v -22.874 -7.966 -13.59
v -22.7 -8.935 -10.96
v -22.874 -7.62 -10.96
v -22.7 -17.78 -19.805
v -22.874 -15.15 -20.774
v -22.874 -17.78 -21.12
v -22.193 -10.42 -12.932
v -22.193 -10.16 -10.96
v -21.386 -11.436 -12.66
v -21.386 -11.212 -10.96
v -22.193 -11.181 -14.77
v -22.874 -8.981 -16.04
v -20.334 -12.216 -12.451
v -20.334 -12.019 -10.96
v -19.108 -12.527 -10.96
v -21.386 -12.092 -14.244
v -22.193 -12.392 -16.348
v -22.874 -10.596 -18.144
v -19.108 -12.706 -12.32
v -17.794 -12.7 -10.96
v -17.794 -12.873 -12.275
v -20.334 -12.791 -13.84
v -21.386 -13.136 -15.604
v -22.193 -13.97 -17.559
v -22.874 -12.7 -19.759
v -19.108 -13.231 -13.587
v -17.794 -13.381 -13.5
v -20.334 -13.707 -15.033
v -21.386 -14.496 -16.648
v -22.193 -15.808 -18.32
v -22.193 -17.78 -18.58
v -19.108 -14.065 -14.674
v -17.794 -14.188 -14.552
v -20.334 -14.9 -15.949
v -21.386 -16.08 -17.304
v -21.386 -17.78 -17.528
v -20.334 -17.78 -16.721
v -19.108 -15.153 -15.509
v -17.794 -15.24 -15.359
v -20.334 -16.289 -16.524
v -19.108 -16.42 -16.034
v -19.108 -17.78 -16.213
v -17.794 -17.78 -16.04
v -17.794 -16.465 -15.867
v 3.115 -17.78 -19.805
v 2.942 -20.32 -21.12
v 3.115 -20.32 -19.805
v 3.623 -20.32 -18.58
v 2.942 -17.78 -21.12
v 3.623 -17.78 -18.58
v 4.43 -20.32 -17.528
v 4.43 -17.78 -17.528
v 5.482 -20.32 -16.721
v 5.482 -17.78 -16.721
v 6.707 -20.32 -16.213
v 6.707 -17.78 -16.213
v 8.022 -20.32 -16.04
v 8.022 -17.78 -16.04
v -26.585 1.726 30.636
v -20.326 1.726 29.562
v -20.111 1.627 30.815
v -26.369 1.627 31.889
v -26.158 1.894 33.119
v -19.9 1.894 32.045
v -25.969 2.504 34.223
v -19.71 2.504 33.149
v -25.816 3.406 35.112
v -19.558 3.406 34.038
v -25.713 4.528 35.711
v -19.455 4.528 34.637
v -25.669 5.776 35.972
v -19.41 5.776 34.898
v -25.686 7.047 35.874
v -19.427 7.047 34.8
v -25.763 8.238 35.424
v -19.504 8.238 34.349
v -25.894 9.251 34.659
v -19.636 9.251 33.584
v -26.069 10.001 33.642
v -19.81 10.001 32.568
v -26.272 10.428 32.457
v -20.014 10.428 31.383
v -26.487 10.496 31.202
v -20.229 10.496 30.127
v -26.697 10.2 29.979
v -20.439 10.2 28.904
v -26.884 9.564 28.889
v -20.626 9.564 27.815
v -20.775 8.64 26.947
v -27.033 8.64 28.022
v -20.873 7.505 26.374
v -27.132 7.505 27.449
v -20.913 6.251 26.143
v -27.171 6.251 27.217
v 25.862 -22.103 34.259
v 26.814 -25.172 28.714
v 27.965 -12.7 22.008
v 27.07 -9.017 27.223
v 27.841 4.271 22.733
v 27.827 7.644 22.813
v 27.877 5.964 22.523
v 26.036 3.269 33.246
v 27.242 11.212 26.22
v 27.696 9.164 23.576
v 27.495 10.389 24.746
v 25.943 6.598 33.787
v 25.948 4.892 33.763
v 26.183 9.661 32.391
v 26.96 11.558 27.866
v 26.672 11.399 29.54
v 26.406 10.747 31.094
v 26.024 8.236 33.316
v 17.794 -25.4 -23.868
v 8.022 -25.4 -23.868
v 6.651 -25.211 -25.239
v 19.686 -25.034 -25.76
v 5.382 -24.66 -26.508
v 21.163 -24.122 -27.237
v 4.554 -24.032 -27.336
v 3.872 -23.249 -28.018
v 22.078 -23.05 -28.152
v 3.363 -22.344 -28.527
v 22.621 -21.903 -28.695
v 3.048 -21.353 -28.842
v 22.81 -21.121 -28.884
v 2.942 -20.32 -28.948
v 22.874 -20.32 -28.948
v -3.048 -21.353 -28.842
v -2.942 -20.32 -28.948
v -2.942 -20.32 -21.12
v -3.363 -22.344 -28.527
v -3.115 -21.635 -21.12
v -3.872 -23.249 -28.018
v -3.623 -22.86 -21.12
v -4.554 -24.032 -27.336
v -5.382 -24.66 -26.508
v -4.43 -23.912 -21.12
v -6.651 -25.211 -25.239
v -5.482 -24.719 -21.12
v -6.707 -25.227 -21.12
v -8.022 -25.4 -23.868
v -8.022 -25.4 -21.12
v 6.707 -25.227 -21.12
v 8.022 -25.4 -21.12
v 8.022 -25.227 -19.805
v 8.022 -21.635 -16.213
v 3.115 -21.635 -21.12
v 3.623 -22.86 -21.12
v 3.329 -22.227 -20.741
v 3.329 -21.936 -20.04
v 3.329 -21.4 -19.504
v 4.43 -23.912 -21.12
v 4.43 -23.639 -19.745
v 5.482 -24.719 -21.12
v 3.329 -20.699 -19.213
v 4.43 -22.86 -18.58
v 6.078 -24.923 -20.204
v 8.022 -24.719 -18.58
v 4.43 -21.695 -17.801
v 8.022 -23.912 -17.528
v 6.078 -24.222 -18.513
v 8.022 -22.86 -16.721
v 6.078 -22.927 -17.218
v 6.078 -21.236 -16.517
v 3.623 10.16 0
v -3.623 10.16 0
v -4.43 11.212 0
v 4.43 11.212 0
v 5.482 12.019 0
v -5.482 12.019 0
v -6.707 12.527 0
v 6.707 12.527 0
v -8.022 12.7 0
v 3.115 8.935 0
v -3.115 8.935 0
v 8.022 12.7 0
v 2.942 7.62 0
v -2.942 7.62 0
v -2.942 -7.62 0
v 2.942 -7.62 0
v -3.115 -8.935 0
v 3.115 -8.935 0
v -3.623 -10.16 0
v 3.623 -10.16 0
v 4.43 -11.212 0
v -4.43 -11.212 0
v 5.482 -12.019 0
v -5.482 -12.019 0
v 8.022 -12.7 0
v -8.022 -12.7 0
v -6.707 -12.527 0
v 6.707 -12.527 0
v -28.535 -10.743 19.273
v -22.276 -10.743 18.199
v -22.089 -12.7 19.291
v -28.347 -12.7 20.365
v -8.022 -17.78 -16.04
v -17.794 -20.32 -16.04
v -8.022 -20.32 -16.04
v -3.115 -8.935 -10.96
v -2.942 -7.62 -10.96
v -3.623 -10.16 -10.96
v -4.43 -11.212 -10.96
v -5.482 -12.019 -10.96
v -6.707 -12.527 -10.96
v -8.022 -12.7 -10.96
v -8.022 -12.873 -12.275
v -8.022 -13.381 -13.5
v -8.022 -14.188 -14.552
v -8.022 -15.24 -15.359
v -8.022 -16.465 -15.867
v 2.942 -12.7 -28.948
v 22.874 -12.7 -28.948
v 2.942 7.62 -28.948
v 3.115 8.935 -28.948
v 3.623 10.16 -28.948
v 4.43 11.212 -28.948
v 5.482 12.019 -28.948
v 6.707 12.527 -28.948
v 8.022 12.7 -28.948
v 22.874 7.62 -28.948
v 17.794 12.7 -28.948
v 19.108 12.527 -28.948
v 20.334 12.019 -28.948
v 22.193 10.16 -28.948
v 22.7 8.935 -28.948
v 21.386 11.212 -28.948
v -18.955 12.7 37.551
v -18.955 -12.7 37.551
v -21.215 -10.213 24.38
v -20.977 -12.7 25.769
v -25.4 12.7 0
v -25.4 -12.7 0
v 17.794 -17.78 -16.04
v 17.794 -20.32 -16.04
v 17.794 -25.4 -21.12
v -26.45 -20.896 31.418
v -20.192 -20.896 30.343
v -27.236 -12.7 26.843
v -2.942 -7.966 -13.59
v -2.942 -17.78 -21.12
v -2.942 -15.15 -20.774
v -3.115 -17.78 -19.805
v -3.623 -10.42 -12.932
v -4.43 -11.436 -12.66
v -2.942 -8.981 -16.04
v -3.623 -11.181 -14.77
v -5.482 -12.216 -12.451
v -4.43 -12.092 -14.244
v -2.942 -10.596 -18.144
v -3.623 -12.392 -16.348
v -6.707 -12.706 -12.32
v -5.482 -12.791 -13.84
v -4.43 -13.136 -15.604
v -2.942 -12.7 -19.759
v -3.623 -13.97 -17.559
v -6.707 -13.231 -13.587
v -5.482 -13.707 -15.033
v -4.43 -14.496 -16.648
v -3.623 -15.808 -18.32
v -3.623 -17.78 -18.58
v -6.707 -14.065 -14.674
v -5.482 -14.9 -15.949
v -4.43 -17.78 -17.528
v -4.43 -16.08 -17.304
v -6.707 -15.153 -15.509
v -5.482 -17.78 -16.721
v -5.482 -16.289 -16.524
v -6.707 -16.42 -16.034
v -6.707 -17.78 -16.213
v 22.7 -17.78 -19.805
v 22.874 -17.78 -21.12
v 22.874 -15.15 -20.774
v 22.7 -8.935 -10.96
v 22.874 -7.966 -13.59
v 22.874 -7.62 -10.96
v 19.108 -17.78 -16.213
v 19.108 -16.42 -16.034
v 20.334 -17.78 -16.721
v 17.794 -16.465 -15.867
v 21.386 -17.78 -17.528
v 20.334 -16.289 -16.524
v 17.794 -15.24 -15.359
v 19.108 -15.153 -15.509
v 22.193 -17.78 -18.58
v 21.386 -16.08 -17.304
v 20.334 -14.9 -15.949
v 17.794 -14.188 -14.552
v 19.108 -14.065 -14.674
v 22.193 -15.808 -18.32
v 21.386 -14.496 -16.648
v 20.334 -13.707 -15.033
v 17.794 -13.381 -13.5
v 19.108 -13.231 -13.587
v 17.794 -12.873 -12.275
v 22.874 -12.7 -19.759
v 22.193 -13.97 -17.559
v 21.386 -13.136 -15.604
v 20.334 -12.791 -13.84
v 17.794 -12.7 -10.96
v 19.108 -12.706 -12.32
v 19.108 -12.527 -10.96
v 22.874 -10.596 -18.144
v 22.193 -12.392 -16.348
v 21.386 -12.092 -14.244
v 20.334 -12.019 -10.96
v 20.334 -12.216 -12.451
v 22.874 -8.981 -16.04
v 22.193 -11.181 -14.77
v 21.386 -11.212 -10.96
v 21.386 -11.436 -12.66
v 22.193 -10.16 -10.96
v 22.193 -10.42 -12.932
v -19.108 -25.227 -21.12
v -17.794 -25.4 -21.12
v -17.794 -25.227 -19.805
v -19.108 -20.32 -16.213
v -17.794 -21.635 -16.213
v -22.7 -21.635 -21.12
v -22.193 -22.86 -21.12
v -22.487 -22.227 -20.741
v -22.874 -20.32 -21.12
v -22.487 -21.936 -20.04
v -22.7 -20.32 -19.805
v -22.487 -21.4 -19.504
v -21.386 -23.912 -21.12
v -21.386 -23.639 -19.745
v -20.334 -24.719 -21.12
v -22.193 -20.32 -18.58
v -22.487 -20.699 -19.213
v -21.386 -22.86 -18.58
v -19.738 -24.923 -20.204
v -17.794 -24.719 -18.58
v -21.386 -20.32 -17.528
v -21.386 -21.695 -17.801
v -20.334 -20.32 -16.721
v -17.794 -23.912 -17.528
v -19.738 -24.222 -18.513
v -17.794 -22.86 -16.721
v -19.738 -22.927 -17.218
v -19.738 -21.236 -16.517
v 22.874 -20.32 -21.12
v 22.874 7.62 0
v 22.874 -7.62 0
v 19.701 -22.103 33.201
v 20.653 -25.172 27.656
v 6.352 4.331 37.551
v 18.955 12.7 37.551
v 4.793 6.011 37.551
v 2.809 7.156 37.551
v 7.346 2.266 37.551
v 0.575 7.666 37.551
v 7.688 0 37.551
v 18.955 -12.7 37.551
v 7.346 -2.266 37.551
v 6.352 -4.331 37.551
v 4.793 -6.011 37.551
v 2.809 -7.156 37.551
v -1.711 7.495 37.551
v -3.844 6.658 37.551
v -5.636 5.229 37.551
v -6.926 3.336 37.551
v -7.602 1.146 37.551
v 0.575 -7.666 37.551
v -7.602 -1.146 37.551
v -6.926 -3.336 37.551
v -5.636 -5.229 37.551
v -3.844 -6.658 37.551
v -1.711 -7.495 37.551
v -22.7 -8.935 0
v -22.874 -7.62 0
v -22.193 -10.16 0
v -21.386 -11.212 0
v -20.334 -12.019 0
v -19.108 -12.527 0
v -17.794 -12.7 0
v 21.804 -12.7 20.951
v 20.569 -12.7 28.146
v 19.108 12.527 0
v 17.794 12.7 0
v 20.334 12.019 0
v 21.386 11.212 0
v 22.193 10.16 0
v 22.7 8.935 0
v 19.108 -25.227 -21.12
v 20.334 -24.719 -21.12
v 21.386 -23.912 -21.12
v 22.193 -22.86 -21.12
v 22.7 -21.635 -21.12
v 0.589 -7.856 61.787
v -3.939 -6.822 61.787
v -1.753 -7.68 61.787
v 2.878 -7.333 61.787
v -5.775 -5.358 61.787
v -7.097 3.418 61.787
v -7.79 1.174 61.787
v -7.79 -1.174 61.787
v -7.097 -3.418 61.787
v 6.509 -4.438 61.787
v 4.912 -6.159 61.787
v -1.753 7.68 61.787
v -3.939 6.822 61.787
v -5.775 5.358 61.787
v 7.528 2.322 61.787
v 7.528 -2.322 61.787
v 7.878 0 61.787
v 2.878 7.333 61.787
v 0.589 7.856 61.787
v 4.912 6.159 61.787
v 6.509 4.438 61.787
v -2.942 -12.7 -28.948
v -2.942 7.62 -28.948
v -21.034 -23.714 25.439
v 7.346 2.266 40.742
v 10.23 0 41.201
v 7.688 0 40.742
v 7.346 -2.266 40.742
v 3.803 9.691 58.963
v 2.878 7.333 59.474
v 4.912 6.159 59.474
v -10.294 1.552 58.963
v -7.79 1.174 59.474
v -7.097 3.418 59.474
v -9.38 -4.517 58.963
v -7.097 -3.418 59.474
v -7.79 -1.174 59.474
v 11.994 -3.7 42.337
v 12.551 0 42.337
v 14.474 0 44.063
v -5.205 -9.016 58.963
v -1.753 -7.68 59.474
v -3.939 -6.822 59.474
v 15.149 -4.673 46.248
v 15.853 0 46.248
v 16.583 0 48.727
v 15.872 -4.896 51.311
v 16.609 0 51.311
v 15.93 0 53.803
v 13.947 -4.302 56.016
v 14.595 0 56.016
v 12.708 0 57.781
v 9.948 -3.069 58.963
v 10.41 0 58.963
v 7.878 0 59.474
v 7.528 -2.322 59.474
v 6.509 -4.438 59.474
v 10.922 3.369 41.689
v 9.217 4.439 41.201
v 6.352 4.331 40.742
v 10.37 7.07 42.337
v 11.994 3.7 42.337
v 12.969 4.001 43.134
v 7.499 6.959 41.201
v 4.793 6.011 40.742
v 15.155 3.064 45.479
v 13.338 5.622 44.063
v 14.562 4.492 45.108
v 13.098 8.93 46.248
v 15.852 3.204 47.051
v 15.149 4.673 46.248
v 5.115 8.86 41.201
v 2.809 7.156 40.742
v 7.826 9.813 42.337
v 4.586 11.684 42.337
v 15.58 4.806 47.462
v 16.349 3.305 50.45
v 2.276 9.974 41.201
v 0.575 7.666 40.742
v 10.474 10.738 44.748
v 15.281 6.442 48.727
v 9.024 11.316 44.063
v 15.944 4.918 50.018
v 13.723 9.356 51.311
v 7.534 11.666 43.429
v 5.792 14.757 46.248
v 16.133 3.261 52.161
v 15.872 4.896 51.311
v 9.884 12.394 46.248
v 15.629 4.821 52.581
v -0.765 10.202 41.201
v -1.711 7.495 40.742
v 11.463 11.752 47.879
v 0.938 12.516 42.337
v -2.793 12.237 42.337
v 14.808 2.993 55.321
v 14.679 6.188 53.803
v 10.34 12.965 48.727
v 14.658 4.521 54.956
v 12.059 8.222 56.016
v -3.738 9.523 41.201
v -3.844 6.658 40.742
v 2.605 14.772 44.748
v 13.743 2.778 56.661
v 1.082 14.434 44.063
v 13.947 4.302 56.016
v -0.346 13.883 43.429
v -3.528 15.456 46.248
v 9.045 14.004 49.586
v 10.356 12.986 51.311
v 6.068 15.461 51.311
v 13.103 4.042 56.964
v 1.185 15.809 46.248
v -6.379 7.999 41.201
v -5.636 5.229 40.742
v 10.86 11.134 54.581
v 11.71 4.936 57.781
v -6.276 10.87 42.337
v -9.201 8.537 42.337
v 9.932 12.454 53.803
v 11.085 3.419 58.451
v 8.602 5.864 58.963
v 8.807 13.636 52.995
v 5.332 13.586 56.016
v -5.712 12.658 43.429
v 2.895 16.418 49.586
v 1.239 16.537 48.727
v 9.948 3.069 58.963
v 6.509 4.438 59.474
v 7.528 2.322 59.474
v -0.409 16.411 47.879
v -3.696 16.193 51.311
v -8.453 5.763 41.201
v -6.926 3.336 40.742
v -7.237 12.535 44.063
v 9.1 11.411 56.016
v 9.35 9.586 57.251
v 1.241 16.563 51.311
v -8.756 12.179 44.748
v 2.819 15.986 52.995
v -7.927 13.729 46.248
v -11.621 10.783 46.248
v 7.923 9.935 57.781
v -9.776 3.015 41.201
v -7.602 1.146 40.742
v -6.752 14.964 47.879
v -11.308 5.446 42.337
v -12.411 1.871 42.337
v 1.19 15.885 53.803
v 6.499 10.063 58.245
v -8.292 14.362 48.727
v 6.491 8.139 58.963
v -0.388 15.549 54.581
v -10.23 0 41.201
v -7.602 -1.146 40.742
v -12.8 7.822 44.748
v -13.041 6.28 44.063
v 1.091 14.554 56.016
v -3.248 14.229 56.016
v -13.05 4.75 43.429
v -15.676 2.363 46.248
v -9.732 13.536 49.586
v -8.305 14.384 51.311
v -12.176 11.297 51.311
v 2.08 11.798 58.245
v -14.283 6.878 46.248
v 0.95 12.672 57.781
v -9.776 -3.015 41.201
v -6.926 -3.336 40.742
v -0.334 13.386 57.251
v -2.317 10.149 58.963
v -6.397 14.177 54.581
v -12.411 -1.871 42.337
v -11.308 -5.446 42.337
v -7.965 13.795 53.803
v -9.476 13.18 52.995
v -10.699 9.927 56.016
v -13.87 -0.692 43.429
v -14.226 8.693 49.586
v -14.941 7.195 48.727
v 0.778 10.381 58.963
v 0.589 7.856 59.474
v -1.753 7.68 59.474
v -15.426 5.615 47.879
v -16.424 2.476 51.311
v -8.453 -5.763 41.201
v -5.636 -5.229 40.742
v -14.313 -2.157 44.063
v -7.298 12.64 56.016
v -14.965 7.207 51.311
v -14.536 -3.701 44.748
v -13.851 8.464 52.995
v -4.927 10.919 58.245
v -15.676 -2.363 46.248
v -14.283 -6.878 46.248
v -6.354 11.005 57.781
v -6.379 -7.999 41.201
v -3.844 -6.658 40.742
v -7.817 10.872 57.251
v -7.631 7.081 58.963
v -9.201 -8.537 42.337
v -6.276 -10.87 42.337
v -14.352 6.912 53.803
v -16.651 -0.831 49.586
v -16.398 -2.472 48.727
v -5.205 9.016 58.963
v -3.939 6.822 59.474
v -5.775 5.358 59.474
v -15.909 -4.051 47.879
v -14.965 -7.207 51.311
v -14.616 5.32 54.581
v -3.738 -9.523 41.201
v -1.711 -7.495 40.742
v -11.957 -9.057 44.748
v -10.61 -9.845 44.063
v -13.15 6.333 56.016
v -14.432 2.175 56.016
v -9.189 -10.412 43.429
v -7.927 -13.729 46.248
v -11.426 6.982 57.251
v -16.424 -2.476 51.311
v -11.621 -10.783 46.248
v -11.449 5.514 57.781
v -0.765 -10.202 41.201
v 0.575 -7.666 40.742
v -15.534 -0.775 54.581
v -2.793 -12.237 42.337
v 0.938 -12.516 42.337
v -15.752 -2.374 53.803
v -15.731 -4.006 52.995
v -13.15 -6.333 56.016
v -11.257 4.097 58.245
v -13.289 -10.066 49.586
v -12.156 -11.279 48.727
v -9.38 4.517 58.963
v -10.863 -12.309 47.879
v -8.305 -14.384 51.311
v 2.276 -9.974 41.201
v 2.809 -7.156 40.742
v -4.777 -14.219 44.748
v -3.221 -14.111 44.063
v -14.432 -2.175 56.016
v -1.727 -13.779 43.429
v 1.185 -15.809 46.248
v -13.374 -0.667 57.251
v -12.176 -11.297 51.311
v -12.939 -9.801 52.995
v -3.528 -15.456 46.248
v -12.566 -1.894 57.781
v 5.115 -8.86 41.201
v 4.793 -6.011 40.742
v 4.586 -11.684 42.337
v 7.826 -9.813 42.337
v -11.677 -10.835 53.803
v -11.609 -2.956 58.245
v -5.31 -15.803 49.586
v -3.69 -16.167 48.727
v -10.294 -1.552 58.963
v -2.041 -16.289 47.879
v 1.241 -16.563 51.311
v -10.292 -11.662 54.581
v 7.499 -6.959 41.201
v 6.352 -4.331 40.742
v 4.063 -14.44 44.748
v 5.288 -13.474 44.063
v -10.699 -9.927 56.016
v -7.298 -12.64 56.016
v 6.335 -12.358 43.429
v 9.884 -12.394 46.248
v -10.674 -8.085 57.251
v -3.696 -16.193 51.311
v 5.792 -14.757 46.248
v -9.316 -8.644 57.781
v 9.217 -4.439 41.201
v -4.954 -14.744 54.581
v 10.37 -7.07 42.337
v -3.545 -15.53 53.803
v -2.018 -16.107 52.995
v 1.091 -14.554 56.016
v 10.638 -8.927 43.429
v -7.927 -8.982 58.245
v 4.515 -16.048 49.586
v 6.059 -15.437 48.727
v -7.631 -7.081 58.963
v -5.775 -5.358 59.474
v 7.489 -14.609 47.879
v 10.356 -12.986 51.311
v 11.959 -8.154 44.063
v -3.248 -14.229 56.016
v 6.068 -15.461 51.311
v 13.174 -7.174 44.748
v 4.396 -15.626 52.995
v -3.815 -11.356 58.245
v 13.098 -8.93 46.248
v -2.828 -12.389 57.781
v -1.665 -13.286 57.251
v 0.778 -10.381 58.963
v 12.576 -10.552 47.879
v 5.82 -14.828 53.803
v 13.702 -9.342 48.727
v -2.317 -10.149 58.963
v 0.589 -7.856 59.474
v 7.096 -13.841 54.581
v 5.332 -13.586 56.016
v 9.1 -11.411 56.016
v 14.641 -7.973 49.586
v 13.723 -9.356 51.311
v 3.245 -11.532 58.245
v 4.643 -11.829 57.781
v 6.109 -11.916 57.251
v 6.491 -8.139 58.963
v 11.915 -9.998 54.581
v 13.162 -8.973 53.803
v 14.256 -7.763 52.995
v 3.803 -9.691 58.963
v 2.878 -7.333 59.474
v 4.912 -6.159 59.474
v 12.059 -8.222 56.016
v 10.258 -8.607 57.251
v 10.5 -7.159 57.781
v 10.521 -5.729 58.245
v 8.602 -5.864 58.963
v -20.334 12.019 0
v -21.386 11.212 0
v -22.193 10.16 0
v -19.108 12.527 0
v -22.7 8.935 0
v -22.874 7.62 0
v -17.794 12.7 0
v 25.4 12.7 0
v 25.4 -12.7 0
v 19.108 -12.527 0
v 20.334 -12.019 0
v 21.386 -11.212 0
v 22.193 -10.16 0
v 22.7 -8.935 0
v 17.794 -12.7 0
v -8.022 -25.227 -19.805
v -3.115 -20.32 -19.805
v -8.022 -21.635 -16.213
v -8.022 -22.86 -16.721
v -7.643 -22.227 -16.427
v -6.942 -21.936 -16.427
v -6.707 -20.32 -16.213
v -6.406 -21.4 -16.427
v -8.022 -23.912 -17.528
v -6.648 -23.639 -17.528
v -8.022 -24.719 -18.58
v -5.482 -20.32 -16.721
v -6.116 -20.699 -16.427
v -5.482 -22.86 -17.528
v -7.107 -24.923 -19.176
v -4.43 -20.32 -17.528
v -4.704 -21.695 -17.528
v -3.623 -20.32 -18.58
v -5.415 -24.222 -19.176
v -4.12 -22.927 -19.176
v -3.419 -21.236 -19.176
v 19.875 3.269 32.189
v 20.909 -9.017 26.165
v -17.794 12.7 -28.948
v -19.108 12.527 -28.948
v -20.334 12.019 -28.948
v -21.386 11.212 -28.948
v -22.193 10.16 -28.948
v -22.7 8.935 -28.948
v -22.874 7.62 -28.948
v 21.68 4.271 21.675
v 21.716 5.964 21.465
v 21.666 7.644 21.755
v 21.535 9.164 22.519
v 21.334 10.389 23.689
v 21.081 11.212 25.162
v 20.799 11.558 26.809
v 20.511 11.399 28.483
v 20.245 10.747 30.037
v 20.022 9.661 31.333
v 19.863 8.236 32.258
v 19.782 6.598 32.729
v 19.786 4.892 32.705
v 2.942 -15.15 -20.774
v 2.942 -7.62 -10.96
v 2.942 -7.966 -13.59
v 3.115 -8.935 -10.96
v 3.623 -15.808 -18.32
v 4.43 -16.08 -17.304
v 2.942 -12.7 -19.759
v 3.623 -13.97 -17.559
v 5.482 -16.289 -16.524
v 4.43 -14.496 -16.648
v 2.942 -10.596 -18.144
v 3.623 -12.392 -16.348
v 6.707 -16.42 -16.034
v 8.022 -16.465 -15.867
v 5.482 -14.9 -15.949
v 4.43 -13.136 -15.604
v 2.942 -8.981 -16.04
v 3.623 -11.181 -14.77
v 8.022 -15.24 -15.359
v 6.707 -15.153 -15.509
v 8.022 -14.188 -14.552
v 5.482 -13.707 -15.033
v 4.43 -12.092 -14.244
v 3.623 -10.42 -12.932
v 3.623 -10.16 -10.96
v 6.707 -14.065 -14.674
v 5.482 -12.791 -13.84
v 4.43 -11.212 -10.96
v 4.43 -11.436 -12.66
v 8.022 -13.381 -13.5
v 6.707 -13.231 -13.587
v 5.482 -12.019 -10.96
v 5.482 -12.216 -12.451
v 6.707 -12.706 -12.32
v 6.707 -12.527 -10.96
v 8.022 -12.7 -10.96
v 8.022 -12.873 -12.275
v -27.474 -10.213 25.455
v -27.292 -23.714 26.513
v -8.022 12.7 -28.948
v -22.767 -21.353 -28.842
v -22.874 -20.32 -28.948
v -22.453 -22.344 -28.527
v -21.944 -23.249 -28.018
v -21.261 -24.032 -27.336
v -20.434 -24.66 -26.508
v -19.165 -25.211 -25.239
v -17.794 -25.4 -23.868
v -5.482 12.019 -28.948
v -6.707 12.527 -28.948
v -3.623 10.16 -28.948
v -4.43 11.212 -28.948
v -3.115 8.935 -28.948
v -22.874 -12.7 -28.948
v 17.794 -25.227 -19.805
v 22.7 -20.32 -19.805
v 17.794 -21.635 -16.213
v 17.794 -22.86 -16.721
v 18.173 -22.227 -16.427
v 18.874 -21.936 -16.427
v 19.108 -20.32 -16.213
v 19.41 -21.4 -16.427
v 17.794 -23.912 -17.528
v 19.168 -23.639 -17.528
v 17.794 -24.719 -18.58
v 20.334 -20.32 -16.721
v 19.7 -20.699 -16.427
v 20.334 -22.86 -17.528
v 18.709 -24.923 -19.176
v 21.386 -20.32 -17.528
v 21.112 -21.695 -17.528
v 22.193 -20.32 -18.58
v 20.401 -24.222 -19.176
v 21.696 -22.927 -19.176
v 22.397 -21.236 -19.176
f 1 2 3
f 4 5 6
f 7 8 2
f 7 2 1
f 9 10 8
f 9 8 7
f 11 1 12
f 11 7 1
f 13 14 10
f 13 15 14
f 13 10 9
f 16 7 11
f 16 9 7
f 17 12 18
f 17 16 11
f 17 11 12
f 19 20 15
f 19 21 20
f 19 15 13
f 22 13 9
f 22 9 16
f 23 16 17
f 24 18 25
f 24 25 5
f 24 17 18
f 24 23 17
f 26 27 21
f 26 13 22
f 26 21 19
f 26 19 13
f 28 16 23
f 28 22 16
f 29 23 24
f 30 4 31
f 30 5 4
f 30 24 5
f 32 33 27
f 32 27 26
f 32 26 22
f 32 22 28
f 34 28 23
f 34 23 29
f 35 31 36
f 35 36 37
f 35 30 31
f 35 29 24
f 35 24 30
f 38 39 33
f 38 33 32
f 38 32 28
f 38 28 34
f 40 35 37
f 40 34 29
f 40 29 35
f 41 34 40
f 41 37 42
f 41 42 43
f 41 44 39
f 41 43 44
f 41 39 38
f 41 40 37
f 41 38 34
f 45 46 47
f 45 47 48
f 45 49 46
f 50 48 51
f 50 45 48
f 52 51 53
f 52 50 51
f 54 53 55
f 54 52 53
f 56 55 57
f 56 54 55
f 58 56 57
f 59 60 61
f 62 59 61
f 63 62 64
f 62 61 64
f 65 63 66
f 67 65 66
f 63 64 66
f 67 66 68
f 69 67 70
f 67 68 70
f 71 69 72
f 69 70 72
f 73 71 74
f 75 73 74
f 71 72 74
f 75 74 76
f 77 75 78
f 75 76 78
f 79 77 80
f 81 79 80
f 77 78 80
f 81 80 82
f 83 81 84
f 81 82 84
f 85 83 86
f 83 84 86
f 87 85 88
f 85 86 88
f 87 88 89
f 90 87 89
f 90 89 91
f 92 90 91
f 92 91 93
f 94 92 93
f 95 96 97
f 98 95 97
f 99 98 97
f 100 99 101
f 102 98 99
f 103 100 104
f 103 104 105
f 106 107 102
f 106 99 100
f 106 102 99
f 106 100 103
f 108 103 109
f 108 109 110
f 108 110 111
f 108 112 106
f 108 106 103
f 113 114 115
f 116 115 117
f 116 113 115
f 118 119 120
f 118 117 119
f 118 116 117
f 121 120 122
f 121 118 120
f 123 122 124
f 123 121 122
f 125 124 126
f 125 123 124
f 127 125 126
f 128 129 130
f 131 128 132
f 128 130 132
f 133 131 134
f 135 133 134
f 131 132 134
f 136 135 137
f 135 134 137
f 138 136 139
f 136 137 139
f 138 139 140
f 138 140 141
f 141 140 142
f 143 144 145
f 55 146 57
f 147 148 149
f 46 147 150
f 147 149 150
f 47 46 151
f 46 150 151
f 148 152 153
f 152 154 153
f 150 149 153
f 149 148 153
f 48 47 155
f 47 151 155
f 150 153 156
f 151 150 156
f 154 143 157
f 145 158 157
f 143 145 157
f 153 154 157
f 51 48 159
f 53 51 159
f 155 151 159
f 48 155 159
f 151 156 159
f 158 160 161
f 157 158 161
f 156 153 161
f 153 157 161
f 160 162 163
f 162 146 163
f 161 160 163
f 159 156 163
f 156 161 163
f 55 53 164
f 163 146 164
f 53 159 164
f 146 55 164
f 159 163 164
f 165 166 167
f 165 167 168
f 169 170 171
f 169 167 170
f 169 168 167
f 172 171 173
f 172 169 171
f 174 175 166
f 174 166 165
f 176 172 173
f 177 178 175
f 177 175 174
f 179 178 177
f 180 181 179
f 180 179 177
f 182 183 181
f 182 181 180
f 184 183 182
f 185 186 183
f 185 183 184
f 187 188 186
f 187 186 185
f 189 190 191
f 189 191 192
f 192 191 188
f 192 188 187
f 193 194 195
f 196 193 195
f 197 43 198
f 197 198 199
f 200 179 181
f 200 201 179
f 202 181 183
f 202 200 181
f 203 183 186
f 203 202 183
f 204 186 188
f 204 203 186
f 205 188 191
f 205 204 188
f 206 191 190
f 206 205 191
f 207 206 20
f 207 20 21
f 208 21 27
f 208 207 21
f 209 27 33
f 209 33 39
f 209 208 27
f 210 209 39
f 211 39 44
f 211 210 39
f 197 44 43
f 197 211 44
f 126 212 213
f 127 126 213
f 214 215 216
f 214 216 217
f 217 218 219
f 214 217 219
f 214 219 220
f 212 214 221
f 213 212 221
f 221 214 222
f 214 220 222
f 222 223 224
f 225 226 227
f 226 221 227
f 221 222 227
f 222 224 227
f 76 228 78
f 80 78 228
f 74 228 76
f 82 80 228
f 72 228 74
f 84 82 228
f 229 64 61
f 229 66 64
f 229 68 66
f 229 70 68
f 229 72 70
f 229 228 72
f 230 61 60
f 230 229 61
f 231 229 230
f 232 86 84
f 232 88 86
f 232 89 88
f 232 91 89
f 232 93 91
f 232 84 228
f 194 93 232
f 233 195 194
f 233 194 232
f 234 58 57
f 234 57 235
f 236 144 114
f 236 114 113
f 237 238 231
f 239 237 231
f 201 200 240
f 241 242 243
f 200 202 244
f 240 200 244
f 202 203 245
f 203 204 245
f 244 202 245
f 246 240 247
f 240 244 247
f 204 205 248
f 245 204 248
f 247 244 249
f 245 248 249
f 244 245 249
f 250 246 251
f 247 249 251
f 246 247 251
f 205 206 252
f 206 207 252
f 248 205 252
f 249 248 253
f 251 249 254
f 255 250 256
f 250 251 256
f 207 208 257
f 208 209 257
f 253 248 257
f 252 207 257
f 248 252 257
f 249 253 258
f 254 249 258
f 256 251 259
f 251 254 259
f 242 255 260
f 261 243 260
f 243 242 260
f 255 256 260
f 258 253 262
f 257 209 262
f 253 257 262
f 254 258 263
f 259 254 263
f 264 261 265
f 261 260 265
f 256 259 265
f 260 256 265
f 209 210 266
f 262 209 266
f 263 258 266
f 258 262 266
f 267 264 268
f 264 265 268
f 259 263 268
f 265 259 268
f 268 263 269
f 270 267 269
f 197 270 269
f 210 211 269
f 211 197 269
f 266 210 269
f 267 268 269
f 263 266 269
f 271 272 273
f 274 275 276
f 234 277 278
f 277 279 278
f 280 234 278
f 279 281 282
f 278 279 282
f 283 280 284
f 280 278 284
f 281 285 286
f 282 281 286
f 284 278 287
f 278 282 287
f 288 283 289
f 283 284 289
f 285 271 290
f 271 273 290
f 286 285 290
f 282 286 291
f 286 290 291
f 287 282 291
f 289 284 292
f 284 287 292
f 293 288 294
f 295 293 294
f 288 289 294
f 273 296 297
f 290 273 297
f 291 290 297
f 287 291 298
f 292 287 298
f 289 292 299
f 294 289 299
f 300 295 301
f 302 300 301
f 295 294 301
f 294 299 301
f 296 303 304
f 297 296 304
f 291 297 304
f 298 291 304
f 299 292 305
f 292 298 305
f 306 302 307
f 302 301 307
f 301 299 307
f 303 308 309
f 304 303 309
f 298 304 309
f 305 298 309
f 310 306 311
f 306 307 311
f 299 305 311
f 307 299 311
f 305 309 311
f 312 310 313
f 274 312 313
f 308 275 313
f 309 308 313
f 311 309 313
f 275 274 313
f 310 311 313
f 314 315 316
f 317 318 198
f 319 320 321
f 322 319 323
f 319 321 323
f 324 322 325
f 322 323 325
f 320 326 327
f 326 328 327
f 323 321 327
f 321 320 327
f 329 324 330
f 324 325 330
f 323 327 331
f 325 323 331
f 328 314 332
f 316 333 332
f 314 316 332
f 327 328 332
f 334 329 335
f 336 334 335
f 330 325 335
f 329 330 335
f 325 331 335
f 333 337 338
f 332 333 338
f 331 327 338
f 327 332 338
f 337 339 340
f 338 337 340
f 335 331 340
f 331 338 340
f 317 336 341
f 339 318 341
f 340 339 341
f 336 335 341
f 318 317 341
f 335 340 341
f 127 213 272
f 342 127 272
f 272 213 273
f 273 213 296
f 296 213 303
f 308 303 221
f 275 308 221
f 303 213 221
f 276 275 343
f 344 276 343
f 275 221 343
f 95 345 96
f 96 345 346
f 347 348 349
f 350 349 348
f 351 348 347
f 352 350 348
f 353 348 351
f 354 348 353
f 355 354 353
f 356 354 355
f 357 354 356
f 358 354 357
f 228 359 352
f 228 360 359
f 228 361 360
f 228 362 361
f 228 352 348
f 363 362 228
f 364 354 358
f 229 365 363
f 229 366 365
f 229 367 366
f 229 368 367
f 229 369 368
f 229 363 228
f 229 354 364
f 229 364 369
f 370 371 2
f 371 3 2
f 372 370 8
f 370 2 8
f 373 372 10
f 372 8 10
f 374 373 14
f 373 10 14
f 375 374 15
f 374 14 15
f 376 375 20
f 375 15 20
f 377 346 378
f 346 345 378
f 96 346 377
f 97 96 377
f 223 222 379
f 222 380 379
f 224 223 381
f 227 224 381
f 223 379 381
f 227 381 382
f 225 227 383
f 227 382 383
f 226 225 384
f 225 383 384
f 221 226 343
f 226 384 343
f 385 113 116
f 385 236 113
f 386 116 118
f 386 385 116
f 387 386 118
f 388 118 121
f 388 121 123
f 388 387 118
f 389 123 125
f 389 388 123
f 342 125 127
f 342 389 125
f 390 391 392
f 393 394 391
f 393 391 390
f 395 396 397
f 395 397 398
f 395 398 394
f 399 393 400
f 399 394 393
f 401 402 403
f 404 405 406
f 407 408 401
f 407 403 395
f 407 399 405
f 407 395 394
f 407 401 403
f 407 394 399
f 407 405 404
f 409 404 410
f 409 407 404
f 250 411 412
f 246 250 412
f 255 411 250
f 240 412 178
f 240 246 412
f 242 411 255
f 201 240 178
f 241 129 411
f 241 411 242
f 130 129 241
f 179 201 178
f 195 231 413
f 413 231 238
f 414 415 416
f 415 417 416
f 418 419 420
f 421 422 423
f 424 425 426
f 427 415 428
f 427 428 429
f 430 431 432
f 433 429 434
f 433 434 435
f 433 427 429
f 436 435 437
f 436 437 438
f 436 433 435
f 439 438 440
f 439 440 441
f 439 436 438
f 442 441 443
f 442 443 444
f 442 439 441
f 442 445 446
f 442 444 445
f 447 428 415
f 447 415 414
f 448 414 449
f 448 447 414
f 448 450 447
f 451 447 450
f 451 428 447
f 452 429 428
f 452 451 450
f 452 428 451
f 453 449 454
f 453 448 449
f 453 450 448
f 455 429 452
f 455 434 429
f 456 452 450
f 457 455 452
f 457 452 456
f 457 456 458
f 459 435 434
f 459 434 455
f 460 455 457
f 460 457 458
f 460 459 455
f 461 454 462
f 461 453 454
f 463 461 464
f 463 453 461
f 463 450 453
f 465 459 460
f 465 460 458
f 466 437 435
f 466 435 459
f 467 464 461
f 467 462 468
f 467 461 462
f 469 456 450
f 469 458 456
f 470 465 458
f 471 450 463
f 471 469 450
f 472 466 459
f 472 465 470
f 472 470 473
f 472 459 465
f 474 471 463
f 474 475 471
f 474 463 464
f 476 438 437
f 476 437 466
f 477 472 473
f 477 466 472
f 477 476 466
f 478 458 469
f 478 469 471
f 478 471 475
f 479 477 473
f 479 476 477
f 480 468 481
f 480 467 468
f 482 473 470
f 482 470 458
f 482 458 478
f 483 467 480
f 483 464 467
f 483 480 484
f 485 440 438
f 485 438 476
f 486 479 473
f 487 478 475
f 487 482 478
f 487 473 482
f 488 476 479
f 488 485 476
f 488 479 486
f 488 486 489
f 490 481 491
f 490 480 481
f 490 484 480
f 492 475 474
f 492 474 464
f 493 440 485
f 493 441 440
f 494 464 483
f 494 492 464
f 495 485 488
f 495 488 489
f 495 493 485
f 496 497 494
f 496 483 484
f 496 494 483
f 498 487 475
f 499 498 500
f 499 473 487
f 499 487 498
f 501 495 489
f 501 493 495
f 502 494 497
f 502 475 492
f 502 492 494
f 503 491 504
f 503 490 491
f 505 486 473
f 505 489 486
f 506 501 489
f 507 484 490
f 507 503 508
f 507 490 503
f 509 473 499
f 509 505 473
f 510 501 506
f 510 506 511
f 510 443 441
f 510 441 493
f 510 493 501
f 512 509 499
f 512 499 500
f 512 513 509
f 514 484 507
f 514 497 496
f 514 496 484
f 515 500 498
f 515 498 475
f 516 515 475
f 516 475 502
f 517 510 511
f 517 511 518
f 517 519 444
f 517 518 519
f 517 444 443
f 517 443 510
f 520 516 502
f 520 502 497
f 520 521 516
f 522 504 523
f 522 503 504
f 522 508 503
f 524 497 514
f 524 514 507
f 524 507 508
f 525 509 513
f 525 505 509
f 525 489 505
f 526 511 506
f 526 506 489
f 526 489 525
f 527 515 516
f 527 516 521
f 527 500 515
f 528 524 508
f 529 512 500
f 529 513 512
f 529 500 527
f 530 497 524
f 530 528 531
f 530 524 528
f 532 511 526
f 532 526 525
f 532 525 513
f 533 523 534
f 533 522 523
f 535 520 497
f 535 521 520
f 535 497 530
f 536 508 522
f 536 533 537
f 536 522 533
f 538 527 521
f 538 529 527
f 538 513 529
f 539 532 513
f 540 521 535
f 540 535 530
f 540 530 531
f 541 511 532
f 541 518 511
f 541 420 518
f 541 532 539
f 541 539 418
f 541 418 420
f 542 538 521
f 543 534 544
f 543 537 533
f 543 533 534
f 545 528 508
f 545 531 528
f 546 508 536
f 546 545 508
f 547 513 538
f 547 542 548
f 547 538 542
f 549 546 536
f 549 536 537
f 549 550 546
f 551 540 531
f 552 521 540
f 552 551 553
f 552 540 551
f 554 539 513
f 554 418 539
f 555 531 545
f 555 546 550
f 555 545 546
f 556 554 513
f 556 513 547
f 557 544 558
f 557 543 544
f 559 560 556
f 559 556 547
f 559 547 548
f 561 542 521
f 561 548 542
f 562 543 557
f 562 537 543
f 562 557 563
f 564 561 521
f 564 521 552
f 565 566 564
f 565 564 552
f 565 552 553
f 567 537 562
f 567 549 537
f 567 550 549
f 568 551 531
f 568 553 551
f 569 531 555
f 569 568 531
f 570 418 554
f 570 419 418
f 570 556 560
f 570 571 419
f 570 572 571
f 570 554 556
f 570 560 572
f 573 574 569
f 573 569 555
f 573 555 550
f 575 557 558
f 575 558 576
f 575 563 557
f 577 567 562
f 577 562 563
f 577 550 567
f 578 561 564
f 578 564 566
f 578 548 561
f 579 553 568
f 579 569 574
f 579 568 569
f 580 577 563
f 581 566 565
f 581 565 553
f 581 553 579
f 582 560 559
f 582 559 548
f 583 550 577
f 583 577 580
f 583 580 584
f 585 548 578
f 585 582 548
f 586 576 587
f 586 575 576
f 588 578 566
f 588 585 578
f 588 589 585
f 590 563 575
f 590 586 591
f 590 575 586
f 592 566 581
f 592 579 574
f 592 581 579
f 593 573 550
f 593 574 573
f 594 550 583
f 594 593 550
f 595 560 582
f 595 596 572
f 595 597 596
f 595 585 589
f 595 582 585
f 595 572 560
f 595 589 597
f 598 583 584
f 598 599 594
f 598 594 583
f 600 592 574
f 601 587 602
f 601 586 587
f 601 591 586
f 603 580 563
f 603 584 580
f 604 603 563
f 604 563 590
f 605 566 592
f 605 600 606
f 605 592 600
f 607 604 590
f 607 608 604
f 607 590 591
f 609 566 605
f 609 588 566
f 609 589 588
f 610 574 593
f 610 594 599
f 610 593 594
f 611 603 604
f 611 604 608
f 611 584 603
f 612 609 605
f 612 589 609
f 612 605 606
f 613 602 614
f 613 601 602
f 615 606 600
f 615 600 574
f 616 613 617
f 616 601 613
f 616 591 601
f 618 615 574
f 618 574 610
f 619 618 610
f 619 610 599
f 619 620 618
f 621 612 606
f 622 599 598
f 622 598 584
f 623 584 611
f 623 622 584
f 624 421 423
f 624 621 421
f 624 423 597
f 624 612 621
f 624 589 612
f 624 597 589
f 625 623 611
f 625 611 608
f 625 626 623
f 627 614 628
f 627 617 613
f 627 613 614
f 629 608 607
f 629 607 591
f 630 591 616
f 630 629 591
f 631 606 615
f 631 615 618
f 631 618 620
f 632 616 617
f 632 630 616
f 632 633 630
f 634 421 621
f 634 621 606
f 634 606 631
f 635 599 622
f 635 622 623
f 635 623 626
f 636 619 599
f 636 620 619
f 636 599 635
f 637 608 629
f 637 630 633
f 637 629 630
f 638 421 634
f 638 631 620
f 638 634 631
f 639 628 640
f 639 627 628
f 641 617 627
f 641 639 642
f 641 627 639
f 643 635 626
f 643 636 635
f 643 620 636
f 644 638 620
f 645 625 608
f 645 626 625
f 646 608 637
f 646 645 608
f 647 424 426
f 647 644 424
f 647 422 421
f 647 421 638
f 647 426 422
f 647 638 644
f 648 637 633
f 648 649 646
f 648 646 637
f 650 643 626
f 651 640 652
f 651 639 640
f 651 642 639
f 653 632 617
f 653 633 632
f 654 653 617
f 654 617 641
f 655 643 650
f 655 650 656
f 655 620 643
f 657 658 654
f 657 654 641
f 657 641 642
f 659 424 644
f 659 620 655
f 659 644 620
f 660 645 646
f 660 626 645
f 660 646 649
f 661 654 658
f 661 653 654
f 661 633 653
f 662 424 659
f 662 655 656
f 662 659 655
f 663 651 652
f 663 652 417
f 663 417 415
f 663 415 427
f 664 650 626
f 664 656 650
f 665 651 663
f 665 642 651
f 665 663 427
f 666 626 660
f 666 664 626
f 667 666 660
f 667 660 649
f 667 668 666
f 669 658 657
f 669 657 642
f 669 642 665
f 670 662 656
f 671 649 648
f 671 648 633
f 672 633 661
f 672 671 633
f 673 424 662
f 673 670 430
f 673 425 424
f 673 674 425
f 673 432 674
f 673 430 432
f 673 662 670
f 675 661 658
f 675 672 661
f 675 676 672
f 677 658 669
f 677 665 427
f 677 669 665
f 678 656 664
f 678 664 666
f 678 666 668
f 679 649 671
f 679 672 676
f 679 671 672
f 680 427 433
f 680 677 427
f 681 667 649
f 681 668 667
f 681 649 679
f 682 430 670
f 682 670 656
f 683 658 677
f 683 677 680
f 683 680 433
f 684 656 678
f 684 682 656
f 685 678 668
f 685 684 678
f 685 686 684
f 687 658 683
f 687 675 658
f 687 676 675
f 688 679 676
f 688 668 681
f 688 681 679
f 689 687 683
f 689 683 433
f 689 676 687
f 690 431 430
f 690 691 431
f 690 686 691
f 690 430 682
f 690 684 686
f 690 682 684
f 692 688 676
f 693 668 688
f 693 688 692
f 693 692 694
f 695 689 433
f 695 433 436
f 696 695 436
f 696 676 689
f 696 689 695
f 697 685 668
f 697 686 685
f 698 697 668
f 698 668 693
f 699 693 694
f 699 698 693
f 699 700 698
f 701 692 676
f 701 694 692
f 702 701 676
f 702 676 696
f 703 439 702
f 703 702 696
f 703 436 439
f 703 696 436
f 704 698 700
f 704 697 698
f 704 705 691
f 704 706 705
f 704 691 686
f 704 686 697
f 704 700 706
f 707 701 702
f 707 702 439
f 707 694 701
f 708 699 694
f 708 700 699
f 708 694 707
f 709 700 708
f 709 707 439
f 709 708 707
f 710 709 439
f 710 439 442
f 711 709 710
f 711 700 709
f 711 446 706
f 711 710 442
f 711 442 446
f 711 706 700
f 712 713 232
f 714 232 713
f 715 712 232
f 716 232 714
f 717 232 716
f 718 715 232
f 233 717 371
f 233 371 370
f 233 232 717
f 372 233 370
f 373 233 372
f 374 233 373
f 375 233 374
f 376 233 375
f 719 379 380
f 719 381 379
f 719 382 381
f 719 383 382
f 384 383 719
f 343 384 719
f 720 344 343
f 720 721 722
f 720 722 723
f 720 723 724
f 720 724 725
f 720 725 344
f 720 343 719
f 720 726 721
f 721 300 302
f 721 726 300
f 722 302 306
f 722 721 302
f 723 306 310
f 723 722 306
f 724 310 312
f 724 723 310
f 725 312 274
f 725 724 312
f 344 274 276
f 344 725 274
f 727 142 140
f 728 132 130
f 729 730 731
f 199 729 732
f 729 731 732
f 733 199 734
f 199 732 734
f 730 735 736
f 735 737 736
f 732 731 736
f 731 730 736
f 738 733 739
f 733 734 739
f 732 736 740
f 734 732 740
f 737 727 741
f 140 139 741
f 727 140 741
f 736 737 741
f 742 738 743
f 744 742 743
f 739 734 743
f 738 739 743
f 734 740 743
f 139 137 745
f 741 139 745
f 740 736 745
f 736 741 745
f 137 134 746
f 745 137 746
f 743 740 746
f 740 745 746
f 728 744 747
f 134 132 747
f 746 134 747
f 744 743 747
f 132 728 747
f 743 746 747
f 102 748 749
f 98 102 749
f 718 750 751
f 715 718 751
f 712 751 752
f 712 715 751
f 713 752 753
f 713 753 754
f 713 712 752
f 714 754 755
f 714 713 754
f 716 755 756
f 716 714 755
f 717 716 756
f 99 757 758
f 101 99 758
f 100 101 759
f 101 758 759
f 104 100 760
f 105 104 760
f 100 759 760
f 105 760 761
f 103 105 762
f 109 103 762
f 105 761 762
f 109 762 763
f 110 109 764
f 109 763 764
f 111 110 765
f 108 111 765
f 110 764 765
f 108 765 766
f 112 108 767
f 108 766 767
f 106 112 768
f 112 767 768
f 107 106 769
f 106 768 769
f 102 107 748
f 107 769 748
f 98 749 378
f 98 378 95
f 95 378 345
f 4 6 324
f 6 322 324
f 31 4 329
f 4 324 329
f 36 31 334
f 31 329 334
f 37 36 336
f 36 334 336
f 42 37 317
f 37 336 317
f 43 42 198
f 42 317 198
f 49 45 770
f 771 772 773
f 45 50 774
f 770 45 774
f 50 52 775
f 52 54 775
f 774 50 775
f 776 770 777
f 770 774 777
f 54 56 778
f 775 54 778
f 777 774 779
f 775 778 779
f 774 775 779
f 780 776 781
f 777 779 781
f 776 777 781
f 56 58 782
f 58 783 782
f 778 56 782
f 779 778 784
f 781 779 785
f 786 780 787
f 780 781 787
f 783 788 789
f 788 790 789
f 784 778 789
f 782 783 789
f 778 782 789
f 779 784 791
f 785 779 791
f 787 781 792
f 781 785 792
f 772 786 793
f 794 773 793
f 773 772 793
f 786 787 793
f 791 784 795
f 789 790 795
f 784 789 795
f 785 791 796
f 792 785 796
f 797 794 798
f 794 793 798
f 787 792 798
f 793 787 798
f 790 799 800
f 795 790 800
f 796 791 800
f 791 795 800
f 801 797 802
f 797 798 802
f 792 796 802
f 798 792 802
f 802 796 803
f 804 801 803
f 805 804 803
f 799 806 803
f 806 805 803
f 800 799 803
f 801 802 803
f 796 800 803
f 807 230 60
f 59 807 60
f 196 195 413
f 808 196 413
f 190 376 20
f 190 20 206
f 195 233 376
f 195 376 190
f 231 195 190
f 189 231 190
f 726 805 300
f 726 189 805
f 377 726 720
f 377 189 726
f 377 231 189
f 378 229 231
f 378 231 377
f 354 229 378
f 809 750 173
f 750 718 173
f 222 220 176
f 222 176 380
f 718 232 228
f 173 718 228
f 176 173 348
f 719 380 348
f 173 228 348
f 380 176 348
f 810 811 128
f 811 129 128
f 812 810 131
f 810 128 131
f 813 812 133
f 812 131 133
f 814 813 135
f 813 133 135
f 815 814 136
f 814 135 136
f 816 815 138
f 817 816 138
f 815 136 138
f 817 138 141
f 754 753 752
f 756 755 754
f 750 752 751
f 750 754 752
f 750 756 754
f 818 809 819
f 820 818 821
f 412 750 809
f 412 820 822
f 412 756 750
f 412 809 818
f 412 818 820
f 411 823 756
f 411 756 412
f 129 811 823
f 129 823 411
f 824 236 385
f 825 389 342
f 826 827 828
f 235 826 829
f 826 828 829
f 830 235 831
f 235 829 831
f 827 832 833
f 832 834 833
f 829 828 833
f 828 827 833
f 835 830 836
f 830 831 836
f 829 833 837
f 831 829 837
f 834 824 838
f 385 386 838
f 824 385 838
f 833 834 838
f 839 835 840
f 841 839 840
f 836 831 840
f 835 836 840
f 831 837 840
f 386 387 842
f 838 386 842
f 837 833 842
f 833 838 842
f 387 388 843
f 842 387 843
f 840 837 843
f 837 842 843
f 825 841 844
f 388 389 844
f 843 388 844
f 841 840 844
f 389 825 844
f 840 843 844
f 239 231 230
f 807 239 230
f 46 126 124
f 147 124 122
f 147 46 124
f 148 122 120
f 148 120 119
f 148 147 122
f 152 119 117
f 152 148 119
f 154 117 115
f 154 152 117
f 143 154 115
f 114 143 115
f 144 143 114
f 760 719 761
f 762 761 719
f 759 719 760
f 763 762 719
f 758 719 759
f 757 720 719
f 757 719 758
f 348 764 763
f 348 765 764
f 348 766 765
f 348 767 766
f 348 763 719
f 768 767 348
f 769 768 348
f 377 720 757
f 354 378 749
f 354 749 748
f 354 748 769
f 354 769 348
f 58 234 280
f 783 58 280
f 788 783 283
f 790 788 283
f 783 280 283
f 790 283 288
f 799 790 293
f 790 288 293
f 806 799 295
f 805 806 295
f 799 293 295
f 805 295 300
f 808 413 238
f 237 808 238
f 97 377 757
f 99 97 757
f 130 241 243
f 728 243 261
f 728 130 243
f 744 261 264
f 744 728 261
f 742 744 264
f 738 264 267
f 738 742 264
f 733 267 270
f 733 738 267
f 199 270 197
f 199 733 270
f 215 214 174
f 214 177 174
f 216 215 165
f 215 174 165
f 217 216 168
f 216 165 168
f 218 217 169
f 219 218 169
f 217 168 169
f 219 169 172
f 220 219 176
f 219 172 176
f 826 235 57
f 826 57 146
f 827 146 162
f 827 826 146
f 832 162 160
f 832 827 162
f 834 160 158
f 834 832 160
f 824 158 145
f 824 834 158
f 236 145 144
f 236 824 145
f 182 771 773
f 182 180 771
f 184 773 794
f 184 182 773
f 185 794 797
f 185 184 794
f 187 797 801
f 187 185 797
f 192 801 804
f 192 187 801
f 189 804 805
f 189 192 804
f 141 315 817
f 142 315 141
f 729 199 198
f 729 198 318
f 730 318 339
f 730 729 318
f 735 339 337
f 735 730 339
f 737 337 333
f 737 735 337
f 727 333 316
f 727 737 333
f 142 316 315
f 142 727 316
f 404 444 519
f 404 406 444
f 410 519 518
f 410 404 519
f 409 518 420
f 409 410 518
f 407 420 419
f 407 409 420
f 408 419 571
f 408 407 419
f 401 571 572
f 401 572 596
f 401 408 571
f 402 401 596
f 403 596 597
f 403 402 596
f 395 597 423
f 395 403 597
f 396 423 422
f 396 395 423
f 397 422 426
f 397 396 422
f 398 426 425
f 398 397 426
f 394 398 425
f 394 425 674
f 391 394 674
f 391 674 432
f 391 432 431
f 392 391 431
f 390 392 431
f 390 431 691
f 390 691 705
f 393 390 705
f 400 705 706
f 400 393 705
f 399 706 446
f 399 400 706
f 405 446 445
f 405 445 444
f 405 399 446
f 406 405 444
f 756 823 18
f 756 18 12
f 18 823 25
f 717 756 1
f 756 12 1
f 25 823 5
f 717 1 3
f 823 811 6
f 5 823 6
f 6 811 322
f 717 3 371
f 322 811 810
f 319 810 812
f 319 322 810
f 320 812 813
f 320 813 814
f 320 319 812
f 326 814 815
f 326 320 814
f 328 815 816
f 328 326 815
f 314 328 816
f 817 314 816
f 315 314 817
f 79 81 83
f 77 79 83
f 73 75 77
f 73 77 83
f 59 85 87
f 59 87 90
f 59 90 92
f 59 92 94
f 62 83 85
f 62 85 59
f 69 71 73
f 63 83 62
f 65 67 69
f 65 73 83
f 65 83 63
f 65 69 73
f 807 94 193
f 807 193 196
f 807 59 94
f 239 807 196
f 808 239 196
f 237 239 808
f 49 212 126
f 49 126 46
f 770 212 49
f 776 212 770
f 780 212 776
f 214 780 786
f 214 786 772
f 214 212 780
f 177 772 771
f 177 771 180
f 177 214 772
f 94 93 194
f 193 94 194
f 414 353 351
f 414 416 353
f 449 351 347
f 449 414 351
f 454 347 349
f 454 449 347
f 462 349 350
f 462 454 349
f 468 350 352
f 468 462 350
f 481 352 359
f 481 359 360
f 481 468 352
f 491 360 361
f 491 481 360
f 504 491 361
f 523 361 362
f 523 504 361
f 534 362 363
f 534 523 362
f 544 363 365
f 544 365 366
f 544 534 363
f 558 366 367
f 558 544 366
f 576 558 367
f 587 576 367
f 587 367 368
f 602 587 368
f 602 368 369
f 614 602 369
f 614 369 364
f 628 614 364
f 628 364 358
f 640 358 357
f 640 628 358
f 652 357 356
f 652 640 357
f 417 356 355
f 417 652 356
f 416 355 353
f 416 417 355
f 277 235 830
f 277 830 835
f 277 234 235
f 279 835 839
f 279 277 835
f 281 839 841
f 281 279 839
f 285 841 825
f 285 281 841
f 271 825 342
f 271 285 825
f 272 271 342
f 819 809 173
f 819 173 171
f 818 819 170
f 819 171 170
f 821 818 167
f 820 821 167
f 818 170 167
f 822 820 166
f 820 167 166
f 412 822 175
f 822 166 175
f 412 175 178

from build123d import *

# Parameters (mm, degrees)
F0_W      = 19.9313152116
F0_H      = 28.9478618652
F1_DEPTH  = 12.7
F2_W      = 19.9313152116
F2_H      = 12.9078961909
F3_DEPTH  = 12.7
F4_F1_R   = 5.08
F4_F2_R   = 5.08
F8_DEPTH  = 6.2511
F10_DEPTH = 6.35


with BuildPart() as f1:
    # F0 (on Front) → F1 (new body, symmetric)
    with BuildSketch(Plane.XZ):
        Polygon((22.873558104, 0), (25.4, 0), (18.9548347086, 37.5508967185), (0, 37.5508967185), (0, 0), (2.9422428925, 0), align=None)
        with Locations((12.9079004982, -14.4739309326)):
            Rectangle(F0_W, F0_H)
        Polygon((0, 0), (0, 37.5508967185), (-18.9548347086, 37.5508967185), (-25.4, 0), (-22.873558104, 0), (-2.9422428925, 0), align=None)
        with Locations((-12.9079004982, -14.4739309326)):
            Rectangle(F0_W, F0_H)
    extrude(amount=F1_DEPTH, both=True)

    # F2 (on face) → F3 (join)
    with BuildSketch(Plane.XZ.offset(12.7)):
        with Locations((12.9079004982, -22.4939137697)):
            Rectangle(F2_W, F2_H)
        with Locations((-12.9079004982, -22.4939137697)):
            Rectangle(F2_W, F2_H)
    extrude(amount=F3_DEPTH)

    # F4: fillet of radius 5.08 on 18 edges, made by hand

    # F4_f1
    f4_f1_edges = [f1.edges().sort_by_distance(p)[0] for p in [
        (12.9079004982, -12.7, -16.0399656743),
        (-12.9079004982, -12.7, -16.0399656743),
    ]]
    fillet(f4_f1_edges, radius=F4_F1_R)

    # F4_f2
    f4_f2_edges = [f1.edges().sort_by_distance(p)[0] for p in [
        (-2.9422428925, -25.4, -22.4939137697),
        (-12.9079004982, -25.4, -16.0399656743),
        (-22.873558104, -25.4, -22.4939137697),
        (-12.9079004982, -25.4, -28.9478618652),
        (22.873558104, -25.4, -22.4939137697),
        (12.9079004982, -25.4, -16.0399656743),
        (2.9422428925, -25.4, -22.4939137697),
        (12.9079004982, -25.4, -28.9478618652),
        (-2.9422428925, -21.59, -16.0399656743),
        (-22.873558104, -21.59, -16.0399656743),
        (22.873558104, 12.7, -14.4739309326),
        (2.9422428925, 12.7, -14.4739309326),
        (-22.873558104, 12.7, -14.4739309326),
        (-2.9422428925, 12.7, -14.4739309326),
        (22.873558104, -12.7, -5.4799828371),
        (2.9422428925, -12.7, -5.4799828371),
        (2.9422428925, -14.1878975516, -14.5520681227),
        (22.873558104, -14.1878975516, -14.5520681227),
        (-22.873558104, -14.1878975516, -14.5520681227),
        (-2.9422428925, -14.1878975516, -14.5520681227),
    ]]
    fillet(f4_f2_edges, radius=F4_F2_R)

    # F5 (on Front) → F6 (revolve)
    with BuildSketch(Plane.XZ):
        with BuildLine():
            Line((7.6877931133, 33.1239514053), (7.6877931133, 40.7419648703))
            ThreePointArc((7.6877931133, 40.7419648703), (16.6857685514, 50.0178025185), (7.8776162118, 59.4740797153))
            Line((7.8776162118, 59.4740797153), (7.8776162118, 61.787083745))
            Line((7.8776162118, 61.787083745), (0, 61.787083745))
            Line((0, 61.787083745), (0, 33.1239514053))
            Line((0, 33.1239514053), (7.6877931133, 33.1239514053))
        make_face()
    revolve(axis=Axis((0, 0, 47.4555175751), (0, 0, 1)))

    # F7 (on face) → F8 (join)
    with BuildSketch(Plane(origin=(24.6731381341, 0, 4.234851027), x_dir=(0, 1, 0), z_dir=(0.9855878404, 0, 0.1691644433))):
        with BuildLine():
            Line((-12.7, 16.9602958167), (4.2709973641, 17.6954660565))
            ThreePointArc((4.2709973641, 17.6954660565), (11.5417566939, 23.7592524776), (3.2686796257, 28.3624733953))
            Line((3.2686796257, 28.3624733953), (-9.0165464208, 22.251194343))
            Line((-9.0165464208, 22.251194343), (-22.1028998209, 29.3900118281))
            Line((-22.1028998209, 29.3900118281), (-25.1719959147, 23.7639713547))
            Line((-25.1719959147, 23.7639713547), (-12.7, 16.9602958167))
        make_face()
    extrude(amount=F8_DEPTH)

    # F9 (on face) → F10 (join)
    with BuildSketch(Plane(origin=(-24.6731381341, 0, 4.234851027), x_dir=(0, -1, 0), z_dir=(-0.9855878404, 0, 0.1691644433))):
        with BuildLine():
            Line((10.2126034461, 20.4402103872), (-1.7259411979, 25.6970115006))
            ThreePointArc((-1.7259411979, 25.6970115006), (-8.7725675478, 30.2032799266), (-6.2509044074, 22.2281552851))
            Line((-6.2509044074, 22.2281552851), (10.7428459451, 14.1681702808))
            Line((10.7428459451, 14.1681702808), (12.7, 15.2765091522))
            Line((12.7, 15.2765091522), (12.7, 21.8488262713))
            Line((12.7, 21.8488262713), (10.2126034461, 20.4402103872))
        make_face()
        Polygon((20.8962647478, 26.4903815939), (12.7, 21.8488262713), (12.7, 15.2765091522), (23.7144064158, 21.5139817446), align=None)
    extrude(amount=F10_DEPTH)


solid = f1.part
